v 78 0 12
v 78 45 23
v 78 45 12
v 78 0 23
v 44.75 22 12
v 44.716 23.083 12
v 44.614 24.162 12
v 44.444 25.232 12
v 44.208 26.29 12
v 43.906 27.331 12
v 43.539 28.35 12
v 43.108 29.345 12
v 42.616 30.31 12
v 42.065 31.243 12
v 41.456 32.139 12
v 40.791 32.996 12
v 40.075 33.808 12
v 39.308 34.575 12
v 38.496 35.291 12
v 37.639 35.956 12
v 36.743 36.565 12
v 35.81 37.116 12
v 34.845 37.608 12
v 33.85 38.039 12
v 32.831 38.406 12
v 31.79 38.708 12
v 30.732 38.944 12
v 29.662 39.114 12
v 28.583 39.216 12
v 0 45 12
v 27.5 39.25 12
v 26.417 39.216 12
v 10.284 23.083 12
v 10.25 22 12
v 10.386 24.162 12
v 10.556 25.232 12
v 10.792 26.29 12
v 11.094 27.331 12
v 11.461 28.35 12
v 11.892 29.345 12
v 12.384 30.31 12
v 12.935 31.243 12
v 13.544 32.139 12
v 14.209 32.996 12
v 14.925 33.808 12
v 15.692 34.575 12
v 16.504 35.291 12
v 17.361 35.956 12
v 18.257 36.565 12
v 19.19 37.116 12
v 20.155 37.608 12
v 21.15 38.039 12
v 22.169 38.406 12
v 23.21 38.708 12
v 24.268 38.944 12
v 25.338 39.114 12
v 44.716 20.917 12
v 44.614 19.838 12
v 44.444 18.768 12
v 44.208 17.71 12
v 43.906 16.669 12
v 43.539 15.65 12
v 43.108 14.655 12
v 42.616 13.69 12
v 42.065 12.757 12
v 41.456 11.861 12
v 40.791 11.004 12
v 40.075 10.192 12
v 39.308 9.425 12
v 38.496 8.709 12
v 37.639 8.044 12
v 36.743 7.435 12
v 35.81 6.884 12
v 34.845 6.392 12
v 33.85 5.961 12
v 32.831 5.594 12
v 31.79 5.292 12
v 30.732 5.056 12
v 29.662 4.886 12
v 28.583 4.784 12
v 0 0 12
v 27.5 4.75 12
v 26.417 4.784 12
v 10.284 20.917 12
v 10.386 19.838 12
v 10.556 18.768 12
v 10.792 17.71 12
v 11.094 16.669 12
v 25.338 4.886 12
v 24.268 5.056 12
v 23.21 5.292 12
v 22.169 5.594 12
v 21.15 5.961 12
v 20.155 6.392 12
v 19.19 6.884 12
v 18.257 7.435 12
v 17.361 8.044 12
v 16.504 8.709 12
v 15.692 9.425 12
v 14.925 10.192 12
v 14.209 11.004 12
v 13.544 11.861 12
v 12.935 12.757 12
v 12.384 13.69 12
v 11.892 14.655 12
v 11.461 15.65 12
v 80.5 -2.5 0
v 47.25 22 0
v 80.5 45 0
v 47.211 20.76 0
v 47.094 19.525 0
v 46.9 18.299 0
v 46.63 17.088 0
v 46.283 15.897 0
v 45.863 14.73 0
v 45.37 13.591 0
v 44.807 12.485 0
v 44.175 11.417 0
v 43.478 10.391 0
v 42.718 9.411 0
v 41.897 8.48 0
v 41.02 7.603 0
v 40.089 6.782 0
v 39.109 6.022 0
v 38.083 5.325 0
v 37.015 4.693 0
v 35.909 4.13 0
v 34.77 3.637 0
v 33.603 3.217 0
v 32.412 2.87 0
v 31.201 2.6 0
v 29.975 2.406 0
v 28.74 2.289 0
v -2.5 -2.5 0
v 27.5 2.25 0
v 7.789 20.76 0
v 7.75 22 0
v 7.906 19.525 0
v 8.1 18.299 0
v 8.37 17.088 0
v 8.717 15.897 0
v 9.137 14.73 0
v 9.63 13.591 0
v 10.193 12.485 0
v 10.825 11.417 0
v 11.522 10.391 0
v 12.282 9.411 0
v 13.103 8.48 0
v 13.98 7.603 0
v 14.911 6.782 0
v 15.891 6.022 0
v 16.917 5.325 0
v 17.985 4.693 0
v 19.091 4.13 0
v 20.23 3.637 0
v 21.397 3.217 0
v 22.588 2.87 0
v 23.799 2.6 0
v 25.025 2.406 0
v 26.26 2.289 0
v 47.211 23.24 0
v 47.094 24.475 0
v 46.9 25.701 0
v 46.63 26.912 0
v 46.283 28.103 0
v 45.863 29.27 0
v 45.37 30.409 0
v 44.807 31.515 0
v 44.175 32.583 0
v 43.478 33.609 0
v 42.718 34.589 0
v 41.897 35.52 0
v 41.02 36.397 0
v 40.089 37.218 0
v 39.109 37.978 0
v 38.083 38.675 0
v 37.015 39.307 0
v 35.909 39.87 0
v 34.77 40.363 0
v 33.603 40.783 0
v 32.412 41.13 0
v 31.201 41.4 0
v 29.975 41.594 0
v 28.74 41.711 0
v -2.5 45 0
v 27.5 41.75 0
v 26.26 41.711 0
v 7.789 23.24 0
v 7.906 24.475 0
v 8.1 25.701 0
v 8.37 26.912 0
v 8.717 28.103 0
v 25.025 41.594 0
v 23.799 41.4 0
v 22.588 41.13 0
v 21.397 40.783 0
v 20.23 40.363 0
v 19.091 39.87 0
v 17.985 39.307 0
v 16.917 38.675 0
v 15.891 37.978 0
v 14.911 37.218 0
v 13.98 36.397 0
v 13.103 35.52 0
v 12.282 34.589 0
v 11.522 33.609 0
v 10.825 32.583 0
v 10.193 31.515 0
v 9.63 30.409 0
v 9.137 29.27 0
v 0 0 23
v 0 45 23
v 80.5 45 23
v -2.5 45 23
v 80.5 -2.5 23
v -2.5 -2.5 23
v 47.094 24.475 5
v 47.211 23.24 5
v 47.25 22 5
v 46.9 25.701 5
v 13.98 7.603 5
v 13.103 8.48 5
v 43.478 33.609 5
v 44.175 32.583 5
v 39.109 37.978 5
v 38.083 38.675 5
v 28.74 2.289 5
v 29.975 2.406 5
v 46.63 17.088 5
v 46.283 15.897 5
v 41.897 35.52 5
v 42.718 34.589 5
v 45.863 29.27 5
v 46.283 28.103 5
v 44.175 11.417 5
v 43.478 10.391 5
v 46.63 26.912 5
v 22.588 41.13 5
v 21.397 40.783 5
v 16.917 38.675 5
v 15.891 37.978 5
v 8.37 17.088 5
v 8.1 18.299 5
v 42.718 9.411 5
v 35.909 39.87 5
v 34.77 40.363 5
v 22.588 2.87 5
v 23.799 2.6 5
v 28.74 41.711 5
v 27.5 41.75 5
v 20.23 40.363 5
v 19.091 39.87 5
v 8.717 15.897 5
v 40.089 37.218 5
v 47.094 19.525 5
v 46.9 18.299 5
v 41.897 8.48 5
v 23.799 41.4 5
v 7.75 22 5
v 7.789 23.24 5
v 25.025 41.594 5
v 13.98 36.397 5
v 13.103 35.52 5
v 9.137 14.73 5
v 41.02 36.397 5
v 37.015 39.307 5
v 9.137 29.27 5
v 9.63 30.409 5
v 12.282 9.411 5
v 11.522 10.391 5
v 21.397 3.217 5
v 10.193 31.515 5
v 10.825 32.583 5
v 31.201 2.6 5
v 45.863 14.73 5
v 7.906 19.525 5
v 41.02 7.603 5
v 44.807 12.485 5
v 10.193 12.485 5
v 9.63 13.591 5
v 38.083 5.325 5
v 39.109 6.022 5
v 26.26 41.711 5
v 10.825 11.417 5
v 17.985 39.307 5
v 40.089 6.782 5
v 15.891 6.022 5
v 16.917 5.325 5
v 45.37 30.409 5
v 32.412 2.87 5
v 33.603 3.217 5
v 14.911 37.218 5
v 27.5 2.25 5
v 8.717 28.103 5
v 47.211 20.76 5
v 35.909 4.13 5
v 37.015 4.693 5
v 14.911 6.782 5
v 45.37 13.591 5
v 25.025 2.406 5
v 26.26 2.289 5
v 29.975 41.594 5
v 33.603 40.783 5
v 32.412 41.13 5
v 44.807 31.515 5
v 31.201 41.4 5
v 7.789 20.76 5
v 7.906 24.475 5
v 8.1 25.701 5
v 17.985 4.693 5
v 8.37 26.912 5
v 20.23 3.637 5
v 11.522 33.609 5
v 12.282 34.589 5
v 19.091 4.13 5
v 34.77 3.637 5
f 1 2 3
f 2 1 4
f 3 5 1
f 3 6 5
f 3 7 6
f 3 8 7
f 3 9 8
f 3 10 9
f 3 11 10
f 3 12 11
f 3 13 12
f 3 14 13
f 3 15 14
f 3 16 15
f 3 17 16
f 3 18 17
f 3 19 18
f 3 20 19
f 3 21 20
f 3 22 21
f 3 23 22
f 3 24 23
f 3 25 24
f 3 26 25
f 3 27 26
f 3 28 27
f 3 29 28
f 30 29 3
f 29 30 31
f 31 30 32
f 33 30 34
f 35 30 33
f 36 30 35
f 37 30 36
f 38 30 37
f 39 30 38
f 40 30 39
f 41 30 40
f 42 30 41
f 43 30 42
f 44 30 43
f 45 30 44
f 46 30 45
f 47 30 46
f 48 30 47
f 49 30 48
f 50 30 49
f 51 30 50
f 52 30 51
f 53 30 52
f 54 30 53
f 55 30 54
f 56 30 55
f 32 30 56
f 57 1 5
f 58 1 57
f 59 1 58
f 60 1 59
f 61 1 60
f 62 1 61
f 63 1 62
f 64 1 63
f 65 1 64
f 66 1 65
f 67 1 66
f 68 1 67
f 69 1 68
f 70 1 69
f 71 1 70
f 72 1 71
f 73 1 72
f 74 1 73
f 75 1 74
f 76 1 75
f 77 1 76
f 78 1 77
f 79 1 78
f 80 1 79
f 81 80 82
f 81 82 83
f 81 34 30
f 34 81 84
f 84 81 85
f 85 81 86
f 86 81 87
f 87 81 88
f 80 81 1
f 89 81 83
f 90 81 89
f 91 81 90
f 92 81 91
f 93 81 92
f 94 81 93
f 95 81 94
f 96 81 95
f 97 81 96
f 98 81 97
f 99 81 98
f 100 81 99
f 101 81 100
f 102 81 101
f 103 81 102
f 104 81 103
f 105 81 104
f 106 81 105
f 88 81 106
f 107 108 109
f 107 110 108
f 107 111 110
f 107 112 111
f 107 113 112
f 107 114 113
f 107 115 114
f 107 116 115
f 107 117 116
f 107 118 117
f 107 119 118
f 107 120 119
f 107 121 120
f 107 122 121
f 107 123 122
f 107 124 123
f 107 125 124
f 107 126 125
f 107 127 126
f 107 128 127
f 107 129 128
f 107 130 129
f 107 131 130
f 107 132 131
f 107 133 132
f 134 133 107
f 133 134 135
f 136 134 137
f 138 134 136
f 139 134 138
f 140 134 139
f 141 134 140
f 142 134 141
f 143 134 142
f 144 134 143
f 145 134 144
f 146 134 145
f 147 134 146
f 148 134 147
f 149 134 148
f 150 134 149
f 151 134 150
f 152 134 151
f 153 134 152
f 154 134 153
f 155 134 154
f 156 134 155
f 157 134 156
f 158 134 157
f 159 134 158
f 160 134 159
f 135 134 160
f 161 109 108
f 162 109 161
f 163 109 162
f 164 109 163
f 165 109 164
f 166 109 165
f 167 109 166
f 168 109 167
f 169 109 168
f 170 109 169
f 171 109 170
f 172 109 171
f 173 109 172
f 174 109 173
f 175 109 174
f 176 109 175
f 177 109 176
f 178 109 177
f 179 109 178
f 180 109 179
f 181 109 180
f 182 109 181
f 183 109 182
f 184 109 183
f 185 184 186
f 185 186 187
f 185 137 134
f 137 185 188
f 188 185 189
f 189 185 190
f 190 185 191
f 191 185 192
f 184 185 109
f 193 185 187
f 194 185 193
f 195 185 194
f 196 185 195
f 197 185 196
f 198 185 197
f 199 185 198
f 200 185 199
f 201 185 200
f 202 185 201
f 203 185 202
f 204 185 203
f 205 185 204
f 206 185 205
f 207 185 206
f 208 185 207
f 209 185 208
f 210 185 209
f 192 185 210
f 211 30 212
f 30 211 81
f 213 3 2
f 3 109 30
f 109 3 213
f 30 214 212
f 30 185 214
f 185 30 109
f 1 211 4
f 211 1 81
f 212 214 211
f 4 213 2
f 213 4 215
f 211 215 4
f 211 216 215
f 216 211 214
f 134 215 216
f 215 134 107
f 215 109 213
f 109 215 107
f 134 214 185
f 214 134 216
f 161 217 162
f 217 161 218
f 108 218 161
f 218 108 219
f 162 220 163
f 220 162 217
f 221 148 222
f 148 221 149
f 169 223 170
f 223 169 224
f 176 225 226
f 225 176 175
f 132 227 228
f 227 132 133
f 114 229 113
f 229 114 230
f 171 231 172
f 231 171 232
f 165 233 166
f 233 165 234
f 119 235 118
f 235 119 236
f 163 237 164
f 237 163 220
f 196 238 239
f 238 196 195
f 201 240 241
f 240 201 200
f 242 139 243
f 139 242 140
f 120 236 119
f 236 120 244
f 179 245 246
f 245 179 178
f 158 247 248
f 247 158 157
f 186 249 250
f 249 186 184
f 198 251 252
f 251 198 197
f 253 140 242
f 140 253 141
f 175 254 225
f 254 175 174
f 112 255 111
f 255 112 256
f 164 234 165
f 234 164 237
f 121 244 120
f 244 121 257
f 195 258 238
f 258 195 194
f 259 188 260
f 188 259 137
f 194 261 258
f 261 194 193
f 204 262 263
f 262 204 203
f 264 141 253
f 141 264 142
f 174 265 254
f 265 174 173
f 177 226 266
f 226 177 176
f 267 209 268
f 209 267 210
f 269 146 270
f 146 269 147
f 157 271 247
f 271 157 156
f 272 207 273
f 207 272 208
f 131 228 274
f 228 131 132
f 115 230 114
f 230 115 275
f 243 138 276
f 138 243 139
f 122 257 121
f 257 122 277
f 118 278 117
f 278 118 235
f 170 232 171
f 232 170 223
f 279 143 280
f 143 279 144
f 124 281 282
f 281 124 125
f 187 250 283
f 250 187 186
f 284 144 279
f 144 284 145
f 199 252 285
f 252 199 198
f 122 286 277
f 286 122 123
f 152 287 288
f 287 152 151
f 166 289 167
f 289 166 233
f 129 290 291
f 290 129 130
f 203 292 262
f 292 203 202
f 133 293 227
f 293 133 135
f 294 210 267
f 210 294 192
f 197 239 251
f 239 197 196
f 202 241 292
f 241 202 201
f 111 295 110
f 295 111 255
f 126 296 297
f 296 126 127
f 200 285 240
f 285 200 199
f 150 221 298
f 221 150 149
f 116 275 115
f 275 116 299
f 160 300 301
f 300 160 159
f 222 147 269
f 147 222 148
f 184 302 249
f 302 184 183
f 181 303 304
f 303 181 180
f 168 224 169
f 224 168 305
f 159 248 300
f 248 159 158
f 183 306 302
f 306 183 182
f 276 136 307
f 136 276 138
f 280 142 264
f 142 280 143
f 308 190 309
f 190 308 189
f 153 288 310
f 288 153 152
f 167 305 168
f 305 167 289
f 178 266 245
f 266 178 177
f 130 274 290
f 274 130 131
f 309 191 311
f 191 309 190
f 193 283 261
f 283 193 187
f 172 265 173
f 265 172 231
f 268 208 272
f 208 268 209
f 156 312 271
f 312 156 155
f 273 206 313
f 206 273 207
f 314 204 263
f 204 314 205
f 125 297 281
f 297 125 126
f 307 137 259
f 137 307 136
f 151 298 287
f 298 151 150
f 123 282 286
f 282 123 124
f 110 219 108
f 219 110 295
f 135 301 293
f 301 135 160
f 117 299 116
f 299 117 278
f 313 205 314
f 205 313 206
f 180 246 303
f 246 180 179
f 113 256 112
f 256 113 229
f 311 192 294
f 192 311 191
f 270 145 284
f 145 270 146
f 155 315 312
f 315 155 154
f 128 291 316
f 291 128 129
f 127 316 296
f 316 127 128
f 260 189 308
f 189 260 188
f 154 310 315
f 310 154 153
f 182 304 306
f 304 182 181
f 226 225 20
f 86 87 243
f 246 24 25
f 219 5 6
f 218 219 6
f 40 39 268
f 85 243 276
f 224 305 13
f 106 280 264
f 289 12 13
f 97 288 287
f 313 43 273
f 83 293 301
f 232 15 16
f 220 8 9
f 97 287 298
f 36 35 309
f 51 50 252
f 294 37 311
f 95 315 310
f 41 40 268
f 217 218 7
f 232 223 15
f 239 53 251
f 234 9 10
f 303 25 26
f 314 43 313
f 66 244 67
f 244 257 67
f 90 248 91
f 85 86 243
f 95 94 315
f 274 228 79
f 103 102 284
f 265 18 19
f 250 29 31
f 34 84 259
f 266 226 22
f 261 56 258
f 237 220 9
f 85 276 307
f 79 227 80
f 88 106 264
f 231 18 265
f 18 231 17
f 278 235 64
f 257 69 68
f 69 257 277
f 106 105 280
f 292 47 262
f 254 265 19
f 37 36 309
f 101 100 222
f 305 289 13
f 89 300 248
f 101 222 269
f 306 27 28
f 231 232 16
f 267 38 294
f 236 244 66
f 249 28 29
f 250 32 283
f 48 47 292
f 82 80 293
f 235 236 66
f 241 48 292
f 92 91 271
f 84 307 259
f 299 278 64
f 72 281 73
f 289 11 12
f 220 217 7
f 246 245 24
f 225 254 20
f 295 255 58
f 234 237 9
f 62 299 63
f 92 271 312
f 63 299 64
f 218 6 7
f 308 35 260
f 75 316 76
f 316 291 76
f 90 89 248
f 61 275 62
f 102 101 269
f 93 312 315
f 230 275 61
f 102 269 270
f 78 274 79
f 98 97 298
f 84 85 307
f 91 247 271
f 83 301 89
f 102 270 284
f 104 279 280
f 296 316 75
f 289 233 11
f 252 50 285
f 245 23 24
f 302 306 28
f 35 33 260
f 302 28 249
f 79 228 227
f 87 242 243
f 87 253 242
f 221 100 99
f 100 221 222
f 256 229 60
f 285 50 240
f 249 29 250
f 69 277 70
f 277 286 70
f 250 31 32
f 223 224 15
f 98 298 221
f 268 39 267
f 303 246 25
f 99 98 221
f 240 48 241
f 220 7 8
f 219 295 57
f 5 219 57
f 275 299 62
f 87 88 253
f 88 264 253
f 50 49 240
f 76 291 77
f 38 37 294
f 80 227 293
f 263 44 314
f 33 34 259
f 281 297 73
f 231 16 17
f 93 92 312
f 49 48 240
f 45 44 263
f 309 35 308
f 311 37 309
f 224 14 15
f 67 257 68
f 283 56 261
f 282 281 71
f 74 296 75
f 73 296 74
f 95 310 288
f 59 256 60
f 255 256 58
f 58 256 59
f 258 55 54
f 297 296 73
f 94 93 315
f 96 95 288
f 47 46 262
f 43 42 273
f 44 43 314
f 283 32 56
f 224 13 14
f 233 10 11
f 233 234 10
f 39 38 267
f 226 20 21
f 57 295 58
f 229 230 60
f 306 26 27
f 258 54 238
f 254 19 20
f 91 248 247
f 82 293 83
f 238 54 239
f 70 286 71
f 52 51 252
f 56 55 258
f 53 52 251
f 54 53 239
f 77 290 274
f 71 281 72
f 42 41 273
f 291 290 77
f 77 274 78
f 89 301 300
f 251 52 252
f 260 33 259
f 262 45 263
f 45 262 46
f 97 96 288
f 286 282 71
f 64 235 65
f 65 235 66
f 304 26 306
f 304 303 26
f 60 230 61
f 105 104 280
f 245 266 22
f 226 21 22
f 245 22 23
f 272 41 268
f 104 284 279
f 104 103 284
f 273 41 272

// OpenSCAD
/* Values in mm */
eyepiece_d = 39.5;
eyepiece_h = 5;
eye_relief = 7;

lens_offset_x = 27.5;
lens_offset_x_bottom = 50;
lens_offset_y = 22;

phone_thickness = 11;

bracket_x = 50;
bracket_x_bottom = 74;
bracket_x_full = 78;
bracket_y = 45;
bracket_z = 5 + eye_relief;
bracket_wall_thickness = 2.5;
bracket_wall_height = bracket_z + phone_thickness;

$fn = 100;

module eyepiece() {
    cylinder(h=eyepiece_h, d=eyepiece_d);
    translate([0, 0, eyepiece_h]) {
        cylinder(h=eye_relief, d1=eyepiece_d, d2=eyepiece_d - 5);
    }
}

module phone_bracket() {
    cube([bracket_x, bracket_y, bracket_z]);
    translate([0, -bracket_wall_thickness, 0]) {
        cube([bracket_x, bracket_wall_thickness, bracket_wall_height]);
    }
    translate([-bracket_wall_thickness, 0, 0]) {
        cube([bracket_wall_thickness, bracket_y, bracket_wall_height]);
    }
    translate([-bracket_wall_thickness, -bracket_wall_thickness, 0]) {
        cube([bracket_wall_thickness, bracket_wall_thickness, bracket_wall_height]);
    }
}

module phone_bracket_bottom() {
    cube([bracket_x_bottom, bracket_y, bracket_z]);
    translate([0, -bracket_wall_thickness, 0]) {
        cube([bracket_x_bottom, bracket_wall_thickness, bracket_wall_height]);
    }
    translate([bracket_x_bottom, 0, 0]) {
        cube([bracket_wall_thickness, bracket_y, bracket_wall_height]);
    }
    translate([bracket_x_bottom, -bracket_wall_thickness, 0]) {
        cube([bracket_wall_thickness, bracket_wall_thickness, bracket_wall_height]);
    }
}

module phone_bracket_full() {
    cube([bracket_x_full, bracket_y, bracket_z]);
    translate([0, -bracket_wall_thickness, 0]) {
        cube([bracket_x_full, bracket_wall_thickness, bracket_wall_height]);
    }
    translate([bracket_x_full, 0, 0]) {
        cube([bracket_wall_thickness, bracket_y, bracket_wall_height]);
    }
    translate([-bracket_wall_thickness, 0, 0]) {
        cube([bracket_wall_thickness, bracket_y, bracket_wall_height]);
    }        
    translate([bracket_x_full, -bracket_wall_thickness, 0]) {
        cube([bracket_wall_thickness, bracket_wall_thickness, bracket_wall_height]);
    }
    translate([-bracket_wall_thickness, -bracket_wall_thickness, 0]) {
        cube([bracket_wall_thickness, bracket_wall_thickness, bracket_wall_height]);
    }
}


module top_mount_bracket() {
    difference() {
        phone_bracket();
        translate([lens_offset_x, lens_offset_y, 0]) {
            eyepiece();
        }
    }
}

module bottom_mount_bracket() {
    difference() {
        phone_bracket_bottom();
        translate([bracket_x_bottom - lens_offset_x_bottom, lens_offset_y, 0]) {
            eyepiece();
        }
    }
}

module full_bracket() {
    difference() {
        phone_bracket_full();
        translate([lens_offset_x, lens_offset_y, 0]) {
            eyepiece();
        }
    }
}

full_bracket();
